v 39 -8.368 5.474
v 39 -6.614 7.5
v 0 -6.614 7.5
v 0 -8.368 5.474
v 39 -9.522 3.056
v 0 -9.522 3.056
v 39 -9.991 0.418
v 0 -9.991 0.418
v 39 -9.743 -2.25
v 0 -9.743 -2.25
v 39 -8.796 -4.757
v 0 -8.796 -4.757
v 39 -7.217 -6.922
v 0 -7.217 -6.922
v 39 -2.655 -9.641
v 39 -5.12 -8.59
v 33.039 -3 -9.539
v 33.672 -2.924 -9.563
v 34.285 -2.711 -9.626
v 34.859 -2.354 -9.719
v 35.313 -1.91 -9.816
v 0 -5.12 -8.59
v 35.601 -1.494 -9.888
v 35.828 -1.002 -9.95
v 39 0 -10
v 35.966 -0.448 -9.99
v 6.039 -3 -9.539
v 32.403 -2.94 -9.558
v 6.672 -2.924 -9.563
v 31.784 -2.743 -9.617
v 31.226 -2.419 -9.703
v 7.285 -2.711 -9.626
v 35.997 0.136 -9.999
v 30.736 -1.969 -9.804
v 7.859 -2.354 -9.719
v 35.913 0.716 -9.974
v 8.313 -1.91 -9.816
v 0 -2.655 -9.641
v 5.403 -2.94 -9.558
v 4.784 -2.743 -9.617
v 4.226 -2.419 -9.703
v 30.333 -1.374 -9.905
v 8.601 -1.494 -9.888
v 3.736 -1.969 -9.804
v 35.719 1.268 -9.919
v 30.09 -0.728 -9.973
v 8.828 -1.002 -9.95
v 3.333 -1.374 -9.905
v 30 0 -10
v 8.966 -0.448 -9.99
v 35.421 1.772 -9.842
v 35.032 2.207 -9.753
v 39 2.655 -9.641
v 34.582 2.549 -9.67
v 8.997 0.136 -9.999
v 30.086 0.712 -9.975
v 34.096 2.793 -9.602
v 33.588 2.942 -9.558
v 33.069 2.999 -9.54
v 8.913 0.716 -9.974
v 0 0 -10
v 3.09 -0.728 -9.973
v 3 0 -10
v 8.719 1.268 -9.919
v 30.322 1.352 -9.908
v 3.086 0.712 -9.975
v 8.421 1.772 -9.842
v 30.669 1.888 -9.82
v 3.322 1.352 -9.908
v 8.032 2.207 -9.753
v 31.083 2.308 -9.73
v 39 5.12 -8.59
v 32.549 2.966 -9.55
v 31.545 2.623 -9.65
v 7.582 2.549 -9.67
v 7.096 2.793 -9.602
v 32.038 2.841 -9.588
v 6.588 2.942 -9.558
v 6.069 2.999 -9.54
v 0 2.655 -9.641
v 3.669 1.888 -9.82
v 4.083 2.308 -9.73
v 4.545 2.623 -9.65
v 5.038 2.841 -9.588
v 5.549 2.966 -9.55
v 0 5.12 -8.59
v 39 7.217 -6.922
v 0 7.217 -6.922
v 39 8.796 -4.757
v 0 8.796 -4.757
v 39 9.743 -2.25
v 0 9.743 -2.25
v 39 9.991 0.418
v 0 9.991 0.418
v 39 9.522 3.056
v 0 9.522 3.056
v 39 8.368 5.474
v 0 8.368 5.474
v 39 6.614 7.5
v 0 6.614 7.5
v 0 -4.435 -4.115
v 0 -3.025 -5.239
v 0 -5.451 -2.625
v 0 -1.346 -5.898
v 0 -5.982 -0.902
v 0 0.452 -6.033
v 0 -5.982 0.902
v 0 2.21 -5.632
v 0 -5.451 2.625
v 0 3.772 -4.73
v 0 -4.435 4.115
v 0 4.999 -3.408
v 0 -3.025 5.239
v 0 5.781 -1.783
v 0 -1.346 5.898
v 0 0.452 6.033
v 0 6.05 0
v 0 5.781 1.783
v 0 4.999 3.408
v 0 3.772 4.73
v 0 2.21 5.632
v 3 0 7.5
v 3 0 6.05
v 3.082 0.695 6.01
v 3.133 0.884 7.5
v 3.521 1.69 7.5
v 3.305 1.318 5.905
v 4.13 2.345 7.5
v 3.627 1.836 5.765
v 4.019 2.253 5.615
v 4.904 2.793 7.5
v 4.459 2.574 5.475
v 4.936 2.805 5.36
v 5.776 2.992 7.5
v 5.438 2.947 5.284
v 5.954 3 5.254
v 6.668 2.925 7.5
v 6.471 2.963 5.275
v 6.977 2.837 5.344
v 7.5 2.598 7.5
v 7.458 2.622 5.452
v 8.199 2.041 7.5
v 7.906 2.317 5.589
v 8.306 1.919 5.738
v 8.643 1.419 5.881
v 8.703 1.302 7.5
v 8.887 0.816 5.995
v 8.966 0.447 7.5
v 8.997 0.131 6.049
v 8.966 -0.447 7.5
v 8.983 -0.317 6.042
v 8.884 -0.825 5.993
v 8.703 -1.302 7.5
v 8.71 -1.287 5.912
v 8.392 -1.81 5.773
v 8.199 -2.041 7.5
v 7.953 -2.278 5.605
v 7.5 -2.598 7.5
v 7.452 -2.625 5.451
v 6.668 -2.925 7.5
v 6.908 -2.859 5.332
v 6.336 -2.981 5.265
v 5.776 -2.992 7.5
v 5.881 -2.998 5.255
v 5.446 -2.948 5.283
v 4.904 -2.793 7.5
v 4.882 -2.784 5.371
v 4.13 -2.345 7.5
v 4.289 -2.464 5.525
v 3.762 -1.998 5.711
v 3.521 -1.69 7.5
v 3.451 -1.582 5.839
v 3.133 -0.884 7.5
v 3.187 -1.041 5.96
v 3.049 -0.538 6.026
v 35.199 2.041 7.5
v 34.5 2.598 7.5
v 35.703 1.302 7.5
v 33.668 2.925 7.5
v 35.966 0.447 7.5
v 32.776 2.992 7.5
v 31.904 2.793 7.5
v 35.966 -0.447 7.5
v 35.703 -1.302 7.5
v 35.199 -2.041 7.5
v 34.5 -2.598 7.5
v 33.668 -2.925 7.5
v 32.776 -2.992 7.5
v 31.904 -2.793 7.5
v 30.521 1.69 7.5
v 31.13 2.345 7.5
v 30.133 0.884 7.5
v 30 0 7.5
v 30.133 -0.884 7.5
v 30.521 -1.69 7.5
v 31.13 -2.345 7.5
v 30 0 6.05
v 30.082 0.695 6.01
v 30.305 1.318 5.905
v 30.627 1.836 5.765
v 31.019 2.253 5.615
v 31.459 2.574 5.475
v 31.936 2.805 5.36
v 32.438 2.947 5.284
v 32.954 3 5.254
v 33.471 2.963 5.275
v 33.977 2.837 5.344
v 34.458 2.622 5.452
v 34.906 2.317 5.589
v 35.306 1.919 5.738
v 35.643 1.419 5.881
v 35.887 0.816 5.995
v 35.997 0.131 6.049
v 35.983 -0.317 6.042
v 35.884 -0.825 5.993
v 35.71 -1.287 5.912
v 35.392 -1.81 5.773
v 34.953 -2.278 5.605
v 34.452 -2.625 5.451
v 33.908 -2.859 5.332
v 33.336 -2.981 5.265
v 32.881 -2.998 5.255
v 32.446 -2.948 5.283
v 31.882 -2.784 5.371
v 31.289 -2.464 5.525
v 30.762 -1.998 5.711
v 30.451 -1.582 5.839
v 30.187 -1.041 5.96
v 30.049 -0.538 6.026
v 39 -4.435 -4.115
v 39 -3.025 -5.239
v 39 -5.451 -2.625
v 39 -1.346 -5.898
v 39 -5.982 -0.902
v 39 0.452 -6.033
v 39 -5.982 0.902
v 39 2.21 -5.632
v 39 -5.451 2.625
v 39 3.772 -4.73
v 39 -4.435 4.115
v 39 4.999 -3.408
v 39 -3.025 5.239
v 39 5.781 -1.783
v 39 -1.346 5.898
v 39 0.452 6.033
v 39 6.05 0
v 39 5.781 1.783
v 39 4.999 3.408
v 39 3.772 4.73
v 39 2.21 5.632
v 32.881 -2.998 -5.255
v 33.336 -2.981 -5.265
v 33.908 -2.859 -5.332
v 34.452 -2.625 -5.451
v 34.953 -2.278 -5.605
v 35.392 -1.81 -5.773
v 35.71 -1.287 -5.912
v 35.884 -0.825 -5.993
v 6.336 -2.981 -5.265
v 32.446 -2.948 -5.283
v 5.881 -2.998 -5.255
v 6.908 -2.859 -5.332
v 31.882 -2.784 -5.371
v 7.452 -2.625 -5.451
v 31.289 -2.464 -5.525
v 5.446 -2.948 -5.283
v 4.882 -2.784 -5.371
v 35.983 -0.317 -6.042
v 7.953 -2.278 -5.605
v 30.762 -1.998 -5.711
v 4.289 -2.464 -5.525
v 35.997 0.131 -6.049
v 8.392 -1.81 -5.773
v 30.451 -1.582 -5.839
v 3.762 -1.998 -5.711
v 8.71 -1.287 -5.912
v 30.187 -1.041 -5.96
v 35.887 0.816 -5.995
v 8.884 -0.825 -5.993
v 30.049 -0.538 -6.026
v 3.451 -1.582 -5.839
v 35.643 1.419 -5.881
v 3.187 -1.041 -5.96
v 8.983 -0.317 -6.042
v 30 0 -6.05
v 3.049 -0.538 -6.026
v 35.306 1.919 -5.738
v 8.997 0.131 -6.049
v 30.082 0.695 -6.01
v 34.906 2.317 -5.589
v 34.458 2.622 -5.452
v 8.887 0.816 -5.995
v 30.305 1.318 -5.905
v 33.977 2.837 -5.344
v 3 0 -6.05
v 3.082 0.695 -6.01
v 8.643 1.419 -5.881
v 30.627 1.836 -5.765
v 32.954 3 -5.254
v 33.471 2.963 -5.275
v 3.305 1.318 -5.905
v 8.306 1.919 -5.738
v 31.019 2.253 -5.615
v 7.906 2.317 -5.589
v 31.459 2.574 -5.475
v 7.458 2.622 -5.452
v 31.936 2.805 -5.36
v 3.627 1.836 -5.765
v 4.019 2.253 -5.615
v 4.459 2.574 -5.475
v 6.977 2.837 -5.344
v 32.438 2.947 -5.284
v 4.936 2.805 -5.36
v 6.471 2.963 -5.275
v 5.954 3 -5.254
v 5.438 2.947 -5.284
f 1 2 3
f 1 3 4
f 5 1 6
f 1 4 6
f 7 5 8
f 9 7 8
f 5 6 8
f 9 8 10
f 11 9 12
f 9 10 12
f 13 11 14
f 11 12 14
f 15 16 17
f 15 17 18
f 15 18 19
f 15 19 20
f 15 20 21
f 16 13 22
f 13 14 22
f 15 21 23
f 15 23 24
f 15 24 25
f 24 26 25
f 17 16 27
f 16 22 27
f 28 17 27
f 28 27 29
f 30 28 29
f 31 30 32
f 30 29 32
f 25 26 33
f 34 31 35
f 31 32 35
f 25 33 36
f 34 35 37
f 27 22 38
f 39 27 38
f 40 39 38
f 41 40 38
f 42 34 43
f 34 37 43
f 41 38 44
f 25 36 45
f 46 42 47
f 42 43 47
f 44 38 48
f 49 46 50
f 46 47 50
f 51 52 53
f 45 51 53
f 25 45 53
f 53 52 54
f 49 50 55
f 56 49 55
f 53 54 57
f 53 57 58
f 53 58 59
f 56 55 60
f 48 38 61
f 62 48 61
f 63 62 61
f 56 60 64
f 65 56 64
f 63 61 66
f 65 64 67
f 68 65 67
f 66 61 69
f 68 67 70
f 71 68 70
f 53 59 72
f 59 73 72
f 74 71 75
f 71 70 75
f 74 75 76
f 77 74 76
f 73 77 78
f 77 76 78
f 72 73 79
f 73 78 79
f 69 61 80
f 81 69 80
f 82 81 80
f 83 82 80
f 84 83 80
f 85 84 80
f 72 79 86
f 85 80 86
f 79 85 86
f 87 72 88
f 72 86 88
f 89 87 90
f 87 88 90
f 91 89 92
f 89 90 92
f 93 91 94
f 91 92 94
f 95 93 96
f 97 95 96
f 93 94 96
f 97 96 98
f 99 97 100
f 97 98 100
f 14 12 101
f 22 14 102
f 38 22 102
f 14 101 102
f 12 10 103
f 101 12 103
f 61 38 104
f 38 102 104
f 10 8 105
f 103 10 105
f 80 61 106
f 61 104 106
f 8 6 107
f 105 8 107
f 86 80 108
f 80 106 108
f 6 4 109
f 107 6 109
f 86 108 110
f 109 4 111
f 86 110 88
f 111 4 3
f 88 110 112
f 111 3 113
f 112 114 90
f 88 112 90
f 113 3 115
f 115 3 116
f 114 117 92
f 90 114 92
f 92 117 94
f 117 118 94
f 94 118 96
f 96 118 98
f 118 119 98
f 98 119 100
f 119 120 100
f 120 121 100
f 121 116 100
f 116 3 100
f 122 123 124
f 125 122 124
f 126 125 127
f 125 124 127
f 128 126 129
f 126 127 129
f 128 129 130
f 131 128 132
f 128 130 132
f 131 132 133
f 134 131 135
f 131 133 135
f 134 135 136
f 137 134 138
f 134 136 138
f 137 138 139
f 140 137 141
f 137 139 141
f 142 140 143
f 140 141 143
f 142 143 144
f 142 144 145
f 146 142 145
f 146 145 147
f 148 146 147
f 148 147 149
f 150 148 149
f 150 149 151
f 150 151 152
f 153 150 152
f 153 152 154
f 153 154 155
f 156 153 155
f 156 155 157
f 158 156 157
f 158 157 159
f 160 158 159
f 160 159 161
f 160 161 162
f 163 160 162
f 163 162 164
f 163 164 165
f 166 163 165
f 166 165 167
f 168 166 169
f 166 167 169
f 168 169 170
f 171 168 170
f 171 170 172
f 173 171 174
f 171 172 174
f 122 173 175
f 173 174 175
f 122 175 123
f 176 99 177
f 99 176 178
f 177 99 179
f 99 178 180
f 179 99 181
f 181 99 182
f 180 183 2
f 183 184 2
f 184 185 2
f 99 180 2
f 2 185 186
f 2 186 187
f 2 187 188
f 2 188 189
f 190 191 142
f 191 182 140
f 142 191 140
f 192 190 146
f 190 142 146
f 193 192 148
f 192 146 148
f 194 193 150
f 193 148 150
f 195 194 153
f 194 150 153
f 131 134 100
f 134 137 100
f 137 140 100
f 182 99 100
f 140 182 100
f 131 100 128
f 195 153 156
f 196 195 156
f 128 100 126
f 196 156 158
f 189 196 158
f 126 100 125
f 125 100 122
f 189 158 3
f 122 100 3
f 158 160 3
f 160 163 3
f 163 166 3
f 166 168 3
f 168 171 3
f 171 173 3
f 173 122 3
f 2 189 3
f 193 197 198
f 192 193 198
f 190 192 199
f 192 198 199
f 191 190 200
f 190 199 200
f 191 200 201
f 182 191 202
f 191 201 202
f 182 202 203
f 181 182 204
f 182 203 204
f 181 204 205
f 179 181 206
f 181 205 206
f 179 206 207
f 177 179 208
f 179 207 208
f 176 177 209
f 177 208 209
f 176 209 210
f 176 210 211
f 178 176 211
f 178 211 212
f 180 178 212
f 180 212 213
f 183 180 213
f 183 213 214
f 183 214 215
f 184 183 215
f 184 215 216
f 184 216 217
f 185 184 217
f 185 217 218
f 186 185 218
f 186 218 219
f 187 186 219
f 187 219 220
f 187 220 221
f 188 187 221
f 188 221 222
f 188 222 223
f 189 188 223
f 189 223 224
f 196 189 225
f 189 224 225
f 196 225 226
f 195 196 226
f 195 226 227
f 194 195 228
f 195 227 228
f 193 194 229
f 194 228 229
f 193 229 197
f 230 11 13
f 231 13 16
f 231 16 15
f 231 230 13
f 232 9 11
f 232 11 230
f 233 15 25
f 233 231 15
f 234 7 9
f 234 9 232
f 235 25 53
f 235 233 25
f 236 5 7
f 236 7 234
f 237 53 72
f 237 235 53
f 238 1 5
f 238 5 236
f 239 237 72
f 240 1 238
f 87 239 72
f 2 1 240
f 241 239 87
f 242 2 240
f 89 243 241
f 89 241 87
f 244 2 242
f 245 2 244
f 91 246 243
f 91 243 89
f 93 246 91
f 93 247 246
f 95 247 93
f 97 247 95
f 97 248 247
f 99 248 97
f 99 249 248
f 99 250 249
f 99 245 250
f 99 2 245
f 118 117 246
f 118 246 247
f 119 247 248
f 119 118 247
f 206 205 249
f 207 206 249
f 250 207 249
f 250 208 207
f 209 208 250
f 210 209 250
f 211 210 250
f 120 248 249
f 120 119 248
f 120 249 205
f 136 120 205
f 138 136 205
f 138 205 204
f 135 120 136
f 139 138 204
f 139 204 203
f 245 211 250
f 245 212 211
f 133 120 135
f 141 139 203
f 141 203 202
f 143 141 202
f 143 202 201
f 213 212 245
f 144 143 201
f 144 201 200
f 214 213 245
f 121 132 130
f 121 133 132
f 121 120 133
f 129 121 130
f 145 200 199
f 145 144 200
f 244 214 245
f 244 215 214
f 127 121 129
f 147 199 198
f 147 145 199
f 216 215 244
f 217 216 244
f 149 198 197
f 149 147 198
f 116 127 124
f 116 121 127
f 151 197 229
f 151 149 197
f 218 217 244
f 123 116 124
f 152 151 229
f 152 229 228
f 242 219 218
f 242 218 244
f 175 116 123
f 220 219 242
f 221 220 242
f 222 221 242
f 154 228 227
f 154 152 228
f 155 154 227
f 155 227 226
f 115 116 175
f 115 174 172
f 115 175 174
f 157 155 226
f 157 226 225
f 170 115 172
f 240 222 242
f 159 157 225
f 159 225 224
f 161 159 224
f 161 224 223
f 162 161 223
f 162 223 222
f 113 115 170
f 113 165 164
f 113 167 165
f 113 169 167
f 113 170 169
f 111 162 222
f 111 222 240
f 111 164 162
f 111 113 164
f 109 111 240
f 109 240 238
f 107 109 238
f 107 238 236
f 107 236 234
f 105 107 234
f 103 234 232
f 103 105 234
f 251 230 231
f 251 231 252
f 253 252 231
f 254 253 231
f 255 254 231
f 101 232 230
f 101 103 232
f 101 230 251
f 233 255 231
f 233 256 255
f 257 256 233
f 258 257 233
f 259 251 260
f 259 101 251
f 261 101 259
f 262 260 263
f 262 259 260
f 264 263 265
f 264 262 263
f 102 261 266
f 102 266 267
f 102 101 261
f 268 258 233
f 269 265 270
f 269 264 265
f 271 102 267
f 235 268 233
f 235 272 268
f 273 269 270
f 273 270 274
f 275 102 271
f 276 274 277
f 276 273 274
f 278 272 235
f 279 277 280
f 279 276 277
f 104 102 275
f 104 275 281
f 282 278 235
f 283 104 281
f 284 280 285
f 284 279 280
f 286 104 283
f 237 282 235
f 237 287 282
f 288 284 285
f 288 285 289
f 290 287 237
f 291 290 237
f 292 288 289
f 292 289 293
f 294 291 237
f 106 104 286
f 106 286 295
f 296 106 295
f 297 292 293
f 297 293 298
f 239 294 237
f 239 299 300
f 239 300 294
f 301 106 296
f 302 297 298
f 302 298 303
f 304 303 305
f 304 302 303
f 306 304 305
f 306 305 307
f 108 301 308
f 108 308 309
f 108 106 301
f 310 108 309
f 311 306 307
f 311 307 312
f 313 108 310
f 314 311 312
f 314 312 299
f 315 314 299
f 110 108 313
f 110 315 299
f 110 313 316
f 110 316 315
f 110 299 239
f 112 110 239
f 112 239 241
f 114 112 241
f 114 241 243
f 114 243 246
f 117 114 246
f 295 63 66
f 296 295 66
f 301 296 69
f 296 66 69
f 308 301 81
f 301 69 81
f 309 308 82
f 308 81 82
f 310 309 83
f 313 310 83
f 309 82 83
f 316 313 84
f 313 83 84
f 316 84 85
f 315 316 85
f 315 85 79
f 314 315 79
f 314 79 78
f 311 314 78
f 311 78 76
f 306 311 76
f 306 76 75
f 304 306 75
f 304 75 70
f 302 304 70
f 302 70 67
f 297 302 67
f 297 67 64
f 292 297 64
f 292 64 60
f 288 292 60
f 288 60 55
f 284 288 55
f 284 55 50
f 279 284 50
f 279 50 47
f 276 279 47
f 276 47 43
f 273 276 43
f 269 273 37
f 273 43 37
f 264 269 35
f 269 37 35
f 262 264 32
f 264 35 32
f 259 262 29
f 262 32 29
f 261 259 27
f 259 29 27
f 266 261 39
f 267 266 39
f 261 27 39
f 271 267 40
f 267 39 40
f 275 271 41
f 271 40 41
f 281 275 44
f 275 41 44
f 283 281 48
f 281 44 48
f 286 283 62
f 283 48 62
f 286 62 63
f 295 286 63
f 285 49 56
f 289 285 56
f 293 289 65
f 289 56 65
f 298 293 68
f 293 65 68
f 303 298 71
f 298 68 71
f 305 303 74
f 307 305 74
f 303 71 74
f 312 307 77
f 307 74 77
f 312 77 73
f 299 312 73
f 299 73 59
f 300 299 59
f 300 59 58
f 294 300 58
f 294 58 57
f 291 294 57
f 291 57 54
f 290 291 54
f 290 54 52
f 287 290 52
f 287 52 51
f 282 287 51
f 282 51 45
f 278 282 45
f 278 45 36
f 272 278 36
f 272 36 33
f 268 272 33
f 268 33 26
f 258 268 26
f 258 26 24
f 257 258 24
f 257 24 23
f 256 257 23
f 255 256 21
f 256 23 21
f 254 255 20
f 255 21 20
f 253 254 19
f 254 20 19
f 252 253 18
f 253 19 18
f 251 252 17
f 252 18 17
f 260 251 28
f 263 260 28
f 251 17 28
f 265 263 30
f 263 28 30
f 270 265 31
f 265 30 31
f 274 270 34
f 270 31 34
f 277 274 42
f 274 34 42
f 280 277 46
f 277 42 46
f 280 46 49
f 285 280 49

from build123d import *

# Parameters (mm, degrees)
F0_R     = 6.05
F1_DEPTH = 39
F3_D     = 6


with BuildPart() as f1:
    # F0 (on Right) → F1 (new body)
    with BuildSketch(Plane.YZ):
        with BuildLine():
            Line((6.614378, 7.5), (-6.614378, 7.5))
            ThreePointArc((-6.614378, 7.5), (0, -10), (6.614378, 7.5))
        make_face()
        Circle(F0_R, mode=Mode.SUBTRACT)
    extrude(amount=F1_DEPTH)

    # F3 (through all)
    with Locations(Plane.XY.offset(7.5)):
        with Locations((6, 0), (33, 0)):
            Hole(F3_D / 2)


solid = f1.part
